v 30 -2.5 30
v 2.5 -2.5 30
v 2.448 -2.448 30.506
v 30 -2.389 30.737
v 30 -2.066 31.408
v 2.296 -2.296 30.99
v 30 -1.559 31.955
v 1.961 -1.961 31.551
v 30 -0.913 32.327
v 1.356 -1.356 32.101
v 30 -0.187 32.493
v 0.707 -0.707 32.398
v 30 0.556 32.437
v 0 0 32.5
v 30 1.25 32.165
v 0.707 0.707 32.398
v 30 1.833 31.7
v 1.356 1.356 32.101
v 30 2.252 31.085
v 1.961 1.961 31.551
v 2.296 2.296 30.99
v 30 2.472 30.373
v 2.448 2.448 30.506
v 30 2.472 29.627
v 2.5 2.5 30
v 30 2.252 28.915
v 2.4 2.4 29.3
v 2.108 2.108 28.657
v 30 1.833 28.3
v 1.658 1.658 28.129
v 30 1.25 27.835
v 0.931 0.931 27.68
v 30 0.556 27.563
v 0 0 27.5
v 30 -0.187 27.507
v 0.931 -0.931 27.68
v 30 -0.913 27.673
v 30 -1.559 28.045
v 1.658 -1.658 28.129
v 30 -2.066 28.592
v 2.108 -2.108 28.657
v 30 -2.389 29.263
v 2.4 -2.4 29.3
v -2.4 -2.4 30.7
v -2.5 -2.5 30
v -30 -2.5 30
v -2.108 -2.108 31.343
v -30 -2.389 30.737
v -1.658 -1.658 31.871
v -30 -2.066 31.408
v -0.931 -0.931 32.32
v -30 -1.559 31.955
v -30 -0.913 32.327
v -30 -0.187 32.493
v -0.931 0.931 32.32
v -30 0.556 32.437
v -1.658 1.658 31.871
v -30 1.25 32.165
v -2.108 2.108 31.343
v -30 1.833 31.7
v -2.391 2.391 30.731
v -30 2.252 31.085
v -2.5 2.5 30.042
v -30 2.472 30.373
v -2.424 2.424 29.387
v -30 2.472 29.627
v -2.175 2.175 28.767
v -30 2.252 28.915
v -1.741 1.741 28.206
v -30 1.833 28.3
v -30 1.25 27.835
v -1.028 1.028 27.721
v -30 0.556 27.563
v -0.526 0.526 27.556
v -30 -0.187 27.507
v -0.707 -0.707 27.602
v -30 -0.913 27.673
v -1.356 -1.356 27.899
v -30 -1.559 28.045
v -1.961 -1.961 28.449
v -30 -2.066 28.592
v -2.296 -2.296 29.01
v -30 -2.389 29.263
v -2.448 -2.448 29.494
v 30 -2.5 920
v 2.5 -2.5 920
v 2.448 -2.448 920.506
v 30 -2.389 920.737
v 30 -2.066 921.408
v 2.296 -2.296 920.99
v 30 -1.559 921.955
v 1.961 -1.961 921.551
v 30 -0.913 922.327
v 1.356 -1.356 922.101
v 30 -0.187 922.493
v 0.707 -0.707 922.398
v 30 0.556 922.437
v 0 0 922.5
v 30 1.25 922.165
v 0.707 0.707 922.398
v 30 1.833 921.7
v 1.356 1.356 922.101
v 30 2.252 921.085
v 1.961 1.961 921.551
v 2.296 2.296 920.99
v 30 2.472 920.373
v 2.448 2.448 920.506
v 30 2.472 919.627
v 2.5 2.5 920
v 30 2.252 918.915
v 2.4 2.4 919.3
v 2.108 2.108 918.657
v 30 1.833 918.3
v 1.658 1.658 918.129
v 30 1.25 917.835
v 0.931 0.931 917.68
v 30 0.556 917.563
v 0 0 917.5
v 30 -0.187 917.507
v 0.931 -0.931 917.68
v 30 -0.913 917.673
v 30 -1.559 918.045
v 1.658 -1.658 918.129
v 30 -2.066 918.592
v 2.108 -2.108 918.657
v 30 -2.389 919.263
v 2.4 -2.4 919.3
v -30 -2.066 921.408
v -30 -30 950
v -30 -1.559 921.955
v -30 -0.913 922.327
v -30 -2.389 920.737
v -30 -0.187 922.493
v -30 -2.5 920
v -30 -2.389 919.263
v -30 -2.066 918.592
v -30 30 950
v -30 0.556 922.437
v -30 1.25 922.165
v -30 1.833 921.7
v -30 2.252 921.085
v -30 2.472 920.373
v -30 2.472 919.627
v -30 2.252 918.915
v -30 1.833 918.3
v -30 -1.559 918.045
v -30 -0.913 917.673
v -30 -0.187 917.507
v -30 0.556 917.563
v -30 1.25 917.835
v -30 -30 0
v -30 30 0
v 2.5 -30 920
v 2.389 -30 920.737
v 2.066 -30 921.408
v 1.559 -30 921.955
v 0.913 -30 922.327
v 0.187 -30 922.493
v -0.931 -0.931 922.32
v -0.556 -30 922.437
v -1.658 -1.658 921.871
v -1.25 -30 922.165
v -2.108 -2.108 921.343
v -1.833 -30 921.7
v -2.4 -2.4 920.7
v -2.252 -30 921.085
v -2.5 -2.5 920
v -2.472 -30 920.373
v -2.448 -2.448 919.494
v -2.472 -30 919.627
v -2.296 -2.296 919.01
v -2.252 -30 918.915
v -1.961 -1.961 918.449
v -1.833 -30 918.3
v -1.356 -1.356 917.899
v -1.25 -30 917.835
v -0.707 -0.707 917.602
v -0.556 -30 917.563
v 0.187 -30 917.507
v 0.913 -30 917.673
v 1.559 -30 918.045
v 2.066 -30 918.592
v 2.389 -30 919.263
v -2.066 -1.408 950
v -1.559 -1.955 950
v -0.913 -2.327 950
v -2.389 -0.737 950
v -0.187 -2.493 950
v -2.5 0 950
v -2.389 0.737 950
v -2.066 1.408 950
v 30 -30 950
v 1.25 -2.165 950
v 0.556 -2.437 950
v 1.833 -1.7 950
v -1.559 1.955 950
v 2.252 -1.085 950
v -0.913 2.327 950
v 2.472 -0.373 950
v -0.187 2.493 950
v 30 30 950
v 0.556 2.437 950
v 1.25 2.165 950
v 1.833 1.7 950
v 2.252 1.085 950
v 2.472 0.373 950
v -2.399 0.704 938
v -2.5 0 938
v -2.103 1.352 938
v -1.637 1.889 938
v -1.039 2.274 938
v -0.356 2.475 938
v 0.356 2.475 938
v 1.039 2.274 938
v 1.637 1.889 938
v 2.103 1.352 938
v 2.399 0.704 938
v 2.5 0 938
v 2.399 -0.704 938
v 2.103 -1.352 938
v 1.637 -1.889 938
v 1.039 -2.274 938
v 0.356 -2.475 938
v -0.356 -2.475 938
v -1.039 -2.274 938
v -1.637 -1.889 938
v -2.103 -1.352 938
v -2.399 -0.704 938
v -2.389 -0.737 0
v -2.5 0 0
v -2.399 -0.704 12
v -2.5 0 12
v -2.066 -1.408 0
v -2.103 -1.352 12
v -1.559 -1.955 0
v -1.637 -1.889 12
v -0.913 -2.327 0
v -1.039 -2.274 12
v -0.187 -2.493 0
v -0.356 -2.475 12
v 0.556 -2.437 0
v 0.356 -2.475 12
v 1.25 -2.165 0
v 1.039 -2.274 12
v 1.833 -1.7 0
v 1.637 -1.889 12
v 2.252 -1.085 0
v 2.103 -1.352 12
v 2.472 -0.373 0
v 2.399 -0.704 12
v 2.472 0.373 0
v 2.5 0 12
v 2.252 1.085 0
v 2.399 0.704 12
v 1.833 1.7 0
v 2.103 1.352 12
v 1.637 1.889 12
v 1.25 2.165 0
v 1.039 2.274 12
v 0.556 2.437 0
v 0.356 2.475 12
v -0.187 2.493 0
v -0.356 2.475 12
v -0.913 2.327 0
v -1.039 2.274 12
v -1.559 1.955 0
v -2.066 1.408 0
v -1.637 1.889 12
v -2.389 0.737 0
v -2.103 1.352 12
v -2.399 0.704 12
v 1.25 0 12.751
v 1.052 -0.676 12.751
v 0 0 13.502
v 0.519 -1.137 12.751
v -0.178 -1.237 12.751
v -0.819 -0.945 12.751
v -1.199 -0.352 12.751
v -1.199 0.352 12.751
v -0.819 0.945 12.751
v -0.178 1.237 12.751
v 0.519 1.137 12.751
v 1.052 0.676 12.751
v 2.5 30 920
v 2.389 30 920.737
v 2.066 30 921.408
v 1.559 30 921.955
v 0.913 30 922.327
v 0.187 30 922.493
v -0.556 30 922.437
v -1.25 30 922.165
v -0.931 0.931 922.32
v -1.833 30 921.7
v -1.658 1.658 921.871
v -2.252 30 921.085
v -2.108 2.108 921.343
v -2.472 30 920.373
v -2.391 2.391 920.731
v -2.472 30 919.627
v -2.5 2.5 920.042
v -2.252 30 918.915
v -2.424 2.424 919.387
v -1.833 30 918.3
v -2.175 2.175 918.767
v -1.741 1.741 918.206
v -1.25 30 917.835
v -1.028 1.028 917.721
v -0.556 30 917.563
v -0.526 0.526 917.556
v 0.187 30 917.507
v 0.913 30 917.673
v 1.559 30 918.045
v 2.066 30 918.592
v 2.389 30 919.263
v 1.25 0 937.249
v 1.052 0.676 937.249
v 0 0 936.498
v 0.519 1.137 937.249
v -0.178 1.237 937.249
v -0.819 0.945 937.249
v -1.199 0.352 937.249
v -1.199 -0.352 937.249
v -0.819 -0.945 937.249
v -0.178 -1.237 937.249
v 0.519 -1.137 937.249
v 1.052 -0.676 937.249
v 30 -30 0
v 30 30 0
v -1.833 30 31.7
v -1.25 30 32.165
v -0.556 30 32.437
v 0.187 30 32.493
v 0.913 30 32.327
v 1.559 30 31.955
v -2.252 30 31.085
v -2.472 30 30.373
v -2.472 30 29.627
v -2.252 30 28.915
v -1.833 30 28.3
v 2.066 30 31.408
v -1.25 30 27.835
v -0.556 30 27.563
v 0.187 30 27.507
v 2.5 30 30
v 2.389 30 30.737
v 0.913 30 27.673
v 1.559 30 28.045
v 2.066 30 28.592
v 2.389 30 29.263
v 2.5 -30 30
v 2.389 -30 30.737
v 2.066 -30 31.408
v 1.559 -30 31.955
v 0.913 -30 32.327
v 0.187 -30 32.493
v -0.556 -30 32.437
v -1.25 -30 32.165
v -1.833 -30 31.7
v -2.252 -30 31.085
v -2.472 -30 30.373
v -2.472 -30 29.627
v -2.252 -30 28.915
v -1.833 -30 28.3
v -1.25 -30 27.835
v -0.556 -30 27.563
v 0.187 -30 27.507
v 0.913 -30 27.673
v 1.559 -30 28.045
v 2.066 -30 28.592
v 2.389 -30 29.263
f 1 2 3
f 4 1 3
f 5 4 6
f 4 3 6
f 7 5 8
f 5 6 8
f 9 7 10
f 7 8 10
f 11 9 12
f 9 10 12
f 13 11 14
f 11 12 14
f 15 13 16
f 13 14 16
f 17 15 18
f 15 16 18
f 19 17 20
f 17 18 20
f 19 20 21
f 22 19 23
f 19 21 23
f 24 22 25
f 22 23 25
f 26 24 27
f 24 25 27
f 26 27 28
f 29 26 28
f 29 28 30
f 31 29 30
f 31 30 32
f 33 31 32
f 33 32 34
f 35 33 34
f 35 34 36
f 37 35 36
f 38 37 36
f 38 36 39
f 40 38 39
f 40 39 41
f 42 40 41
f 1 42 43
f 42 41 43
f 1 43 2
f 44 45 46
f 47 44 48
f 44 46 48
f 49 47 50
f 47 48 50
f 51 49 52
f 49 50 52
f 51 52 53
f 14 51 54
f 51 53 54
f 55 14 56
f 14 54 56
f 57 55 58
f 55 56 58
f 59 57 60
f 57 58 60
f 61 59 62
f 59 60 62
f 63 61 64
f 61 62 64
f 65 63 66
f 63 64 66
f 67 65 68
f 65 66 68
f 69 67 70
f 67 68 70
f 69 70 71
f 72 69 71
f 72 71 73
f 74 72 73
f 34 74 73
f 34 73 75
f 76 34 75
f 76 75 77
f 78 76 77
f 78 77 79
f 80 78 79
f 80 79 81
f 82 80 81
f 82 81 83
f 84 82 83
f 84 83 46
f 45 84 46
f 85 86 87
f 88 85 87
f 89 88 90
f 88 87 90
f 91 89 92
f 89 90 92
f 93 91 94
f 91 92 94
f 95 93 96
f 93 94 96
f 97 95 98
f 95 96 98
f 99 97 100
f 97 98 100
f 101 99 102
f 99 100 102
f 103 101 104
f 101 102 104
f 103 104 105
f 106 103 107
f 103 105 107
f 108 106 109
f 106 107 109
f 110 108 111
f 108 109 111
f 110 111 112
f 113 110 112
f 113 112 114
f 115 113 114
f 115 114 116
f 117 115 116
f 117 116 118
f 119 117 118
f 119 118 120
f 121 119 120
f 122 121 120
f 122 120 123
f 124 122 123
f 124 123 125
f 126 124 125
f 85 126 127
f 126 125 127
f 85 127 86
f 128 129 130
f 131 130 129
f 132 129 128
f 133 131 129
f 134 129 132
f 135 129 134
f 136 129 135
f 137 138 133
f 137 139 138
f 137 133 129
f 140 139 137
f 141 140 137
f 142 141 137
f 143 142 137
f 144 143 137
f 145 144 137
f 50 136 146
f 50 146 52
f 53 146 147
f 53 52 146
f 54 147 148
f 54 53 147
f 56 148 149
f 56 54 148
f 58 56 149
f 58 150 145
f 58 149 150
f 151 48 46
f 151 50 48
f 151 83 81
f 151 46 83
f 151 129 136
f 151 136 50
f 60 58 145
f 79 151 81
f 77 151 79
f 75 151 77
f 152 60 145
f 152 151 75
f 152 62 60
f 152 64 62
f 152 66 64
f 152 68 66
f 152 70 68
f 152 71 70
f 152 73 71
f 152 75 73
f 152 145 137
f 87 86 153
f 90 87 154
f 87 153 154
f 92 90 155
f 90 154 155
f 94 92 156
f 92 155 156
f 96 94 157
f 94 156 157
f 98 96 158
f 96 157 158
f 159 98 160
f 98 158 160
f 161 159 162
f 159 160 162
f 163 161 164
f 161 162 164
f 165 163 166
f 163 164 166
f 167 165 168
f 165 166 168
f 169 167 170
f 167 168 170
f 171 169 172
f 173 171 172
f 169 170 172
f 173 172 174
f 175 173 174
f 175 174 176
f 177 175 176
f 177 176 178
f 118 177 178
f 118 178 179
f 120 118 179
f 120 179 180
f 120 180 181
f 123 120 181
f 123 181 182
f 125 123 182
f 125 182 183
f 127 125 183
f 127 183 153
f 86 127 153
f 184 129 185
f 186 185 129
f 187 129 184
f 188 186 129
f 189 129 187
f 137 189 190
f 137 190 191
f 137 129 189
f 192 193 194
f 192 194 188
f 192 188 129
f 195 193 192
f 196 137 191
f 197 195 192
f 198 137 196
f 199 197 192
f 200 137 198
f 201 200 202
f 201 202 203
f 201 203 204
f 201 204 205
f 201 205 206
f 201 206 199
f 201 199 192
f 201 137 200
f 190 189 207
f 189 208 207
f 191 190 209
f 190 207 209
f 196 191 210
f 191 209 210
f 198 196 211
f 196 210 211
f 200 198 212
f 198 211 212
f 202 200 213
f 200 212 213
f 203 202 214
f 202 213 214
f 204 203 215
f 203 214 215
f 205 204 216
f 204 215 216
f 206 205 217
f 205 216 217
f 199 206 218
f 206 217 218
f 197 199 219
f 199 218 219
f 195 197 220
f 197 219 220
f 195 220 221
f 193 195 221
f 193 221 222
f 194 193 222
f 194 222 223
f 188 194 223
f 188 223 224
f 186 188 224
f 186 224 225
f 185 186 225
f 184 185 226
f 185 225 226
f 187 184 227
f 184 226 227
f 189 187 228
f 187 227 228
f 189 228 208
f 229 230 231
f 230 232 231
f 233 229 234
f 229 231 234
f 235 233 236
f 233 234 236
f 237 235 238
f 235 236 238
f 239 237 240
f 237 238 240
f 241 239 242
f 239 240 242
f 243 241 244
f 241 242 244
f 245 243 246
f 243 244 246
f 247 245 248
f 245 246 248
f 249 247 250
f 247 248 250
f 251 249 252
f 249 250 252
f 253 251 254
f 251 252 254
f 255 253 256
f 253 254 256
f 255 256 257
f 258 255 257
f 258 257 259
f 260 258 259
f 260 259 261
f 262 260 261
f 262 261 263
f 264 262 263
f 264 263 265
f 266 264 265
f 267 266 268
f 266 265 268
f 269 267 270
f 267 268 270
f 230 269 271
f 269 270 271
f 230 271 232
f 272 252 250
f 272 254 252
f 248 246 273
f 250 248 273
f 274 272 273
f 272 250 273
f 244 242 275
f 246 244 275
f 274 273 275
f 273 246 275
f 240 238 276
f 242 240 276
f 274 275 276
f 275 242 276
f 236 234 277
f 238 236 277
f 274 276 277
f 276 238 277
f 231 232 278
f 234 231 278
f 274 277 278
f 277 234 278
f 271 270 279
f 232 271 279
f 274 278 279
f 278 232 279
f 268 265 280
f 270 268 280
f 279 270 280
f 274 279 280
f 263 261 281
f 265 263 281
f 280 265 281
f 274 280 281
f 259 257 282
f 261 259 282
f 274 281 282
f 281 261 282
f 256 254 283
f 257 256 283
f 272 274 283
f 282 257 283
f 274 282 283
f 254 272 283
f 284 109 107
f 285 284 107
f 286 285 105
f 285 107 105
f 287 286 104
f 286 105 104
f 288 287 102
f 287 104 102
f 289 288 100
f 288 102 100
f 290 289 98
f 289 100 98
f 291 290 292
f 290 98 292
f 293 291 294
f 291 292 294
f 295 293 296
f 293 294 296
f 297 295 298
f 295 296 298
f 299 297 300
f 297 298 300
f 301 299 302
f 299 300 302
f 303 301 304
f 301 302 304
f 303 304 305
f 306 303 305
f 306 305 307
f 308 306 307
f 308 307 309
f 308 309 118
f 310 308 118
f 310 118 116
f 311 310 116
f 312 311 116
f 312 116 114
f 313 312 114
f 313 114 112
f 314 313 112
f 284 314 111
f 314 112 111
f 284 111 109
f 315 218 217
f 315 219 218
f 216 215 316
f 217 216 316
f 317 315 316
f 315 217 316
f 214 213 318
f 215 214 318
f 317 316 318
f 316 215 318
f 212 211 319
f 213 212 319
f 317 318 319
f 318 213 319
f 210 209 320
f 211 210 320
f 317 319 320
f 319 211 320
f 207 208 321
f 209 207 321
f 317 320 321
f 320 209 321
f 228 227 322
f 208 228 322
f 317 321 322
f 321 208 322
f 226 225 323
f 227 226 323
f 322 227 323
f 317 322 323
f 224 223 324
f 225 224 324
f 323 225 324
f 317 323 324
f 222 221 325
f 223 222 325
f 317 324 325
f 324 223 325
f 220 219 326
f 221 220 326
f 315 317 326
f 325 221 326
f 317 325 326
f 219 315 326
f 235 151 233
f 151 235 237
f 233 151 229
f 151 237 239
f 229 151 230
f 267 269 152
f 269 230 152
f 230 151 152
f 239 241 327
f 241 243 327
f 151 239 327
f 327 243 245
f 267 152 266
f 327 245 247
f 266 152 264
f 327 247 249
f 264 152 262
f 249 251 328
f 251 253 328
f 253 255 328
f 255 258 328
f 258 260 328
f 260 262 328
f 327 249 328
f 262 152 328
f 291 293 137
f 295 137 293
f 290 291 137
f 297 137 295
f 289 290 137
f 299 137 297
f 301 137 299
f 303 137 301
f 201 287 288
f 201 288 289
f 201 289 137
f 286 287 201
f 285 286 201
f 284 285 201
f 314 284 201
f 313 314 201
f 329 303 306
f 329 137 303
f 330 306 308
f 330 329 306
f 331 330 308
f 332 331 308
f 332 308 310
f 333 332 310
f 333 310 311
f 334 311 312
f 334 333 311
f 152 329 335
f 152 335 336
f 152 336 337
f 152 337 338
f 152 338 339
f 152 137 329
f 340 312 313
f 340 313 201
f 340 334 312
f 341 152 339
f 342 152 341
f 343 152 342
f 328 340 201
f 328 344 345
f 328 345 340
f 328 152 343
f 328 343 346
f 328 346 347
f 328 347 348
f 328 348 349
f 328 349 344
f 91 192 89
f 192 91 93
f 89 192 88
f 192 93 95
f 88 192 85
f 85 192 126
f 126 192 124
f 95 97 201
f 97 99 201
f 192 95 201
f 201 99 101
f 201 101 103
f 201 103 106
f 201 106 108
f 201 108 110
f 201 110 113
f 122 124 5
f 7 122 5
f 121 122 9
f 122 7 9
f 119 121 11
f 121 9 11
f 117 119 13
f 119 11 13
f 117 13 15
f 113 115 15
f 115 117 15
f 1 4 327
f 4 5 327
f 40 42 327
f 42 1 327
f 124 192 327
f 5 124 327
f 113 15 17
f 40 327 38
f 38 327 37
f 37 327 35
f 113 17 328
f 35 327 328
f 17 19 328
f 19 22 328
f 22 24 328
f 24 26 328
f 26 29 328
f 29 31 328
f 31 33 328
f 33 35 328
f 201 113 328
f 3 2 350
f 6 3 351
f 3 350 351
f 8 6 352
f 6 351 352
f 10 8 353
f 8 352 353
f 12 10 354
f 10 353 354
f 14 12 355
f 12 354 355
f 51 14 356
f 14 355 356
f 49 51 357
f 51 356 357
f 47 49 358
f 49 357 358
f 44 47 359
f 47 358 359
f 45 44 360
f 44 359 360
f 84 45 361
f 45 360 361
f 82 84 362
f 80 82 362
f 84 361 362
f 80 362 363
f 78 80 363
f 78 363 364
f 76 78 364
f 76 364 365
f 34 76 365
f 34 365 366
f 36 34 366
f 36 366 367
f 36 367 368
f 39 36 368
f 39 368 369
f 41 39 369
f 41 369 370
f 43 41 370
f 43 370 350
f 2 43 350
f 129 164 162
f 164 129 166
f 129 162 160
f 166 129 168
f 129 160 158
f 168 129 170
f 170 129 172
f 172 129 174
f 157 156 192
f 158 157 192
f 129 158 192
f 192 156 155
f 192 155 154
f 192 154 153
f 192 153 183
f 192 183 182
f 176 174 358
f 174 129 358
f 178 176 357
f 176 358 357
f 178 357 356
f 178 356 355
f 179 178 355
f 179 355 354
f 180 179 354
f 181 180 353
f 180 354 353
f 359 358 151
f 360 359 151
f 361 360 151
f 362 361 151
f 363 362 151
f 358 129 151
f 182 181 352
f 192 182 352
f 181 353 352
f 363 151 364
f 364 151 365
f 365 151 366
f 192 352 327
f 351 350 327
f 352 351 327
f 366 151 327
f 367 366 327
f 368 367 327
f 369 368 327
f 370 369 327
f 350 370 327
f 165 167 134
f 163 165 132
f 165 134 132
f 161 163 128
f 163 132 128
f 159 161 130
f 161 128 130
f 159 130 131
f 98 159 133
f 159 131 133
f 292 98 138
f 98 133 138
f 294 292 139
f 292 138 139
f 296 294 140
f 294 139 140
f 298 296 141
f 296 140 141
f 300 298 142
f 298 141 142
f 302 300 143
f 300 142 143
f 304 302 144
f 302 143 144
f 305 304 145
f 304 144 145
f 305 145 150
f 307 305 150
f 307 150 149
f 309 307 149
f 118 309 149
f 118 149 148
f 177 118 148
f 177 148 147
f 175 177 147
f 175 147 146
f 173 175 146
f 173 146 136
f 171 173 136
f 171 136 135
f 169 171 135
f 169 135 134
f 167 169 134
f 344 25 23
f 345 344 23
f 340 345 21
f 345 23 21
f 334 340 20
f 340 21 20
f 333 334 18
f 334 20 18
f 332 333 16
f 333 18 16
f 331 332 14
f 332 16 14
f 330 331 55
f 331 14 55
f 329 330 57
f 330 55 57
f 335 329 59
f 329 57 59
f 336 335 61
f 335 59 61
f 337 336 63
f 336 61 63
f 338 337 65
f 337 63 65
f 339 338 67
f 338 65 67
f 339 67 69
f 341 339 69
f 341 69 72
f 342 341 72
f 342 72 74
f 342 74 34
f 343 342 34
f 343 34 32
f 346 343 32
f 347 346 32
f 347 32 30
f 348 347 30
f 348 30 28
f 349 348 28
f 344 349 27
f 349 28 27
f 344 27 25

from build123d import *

# Parameters (mm, degrees)
F1_W           = 60
F1_H           = 60
F2_DEPTH       = 950
F7_D           = 5
F7_DEPTH       = 12
F7_TIP         = 1.5021515476
F7_ON_F4_D     = 5
F7_ON_F4_DEPTH = 12
F7_ON_F4_TIP   = 1.5021515476
F8_D           = 5
F8_ON_F5_D     = 5


with BuildPart() as f2:
    # F1 (on Top) → F2 (new body)
    with BuildSketch(Plane.XY):
        Rectangle(F1_W, F1_H)
    extrude(amount=F2_DEPTH)

    # F7
    with Locations(Plane.XY.offset(950)):
        with Locations((0, 0)):
            Hole(F7_D / 2, depth=F7_DEPTH)
            with Locations((0, 0, -(F7_DEPTH + F7_TIP / 2))):  # 118° drill point
                Cone(0, F7_D / 2, F7_TIP, mode=Mode.SUBTRACT)

    # F7 on F4
    with Locations(Plane(origin=(0, 0, 0), x_dir=(1, 0, 0), z_dir=(0, 0, -1))):
        with Locations((0, 0)):
            Hole(F7_ON_F4_D / 2, depth=F7_ON_F4_DEPTH)
            with Locations((0, 0, -(F7_ON_F4_DEPTH + F7_ON_F4_TIP / 2))):  # 118° drill point
                Cone(0, F7_ON_F4_D / 2, F7_ON_F4_TIP, mode=Mode.SUBTRACT)

    # F8 (through all)
    with Locations(Plane(origin=(0, 30, 0), x_dir=(-1, 0, 0), z_dir=(0, 1, 0))):
        with Locations((0, 920), (0, 30)):
            Hole(F8_D / 2)

    # F8 on F5 (through all)
    with Locations(Plane.YZ.offset(30)):
        with Locations((0, 920), (0, 30)):
            Hole(F8_ON_F5_D / 2)


solid = f2.part
